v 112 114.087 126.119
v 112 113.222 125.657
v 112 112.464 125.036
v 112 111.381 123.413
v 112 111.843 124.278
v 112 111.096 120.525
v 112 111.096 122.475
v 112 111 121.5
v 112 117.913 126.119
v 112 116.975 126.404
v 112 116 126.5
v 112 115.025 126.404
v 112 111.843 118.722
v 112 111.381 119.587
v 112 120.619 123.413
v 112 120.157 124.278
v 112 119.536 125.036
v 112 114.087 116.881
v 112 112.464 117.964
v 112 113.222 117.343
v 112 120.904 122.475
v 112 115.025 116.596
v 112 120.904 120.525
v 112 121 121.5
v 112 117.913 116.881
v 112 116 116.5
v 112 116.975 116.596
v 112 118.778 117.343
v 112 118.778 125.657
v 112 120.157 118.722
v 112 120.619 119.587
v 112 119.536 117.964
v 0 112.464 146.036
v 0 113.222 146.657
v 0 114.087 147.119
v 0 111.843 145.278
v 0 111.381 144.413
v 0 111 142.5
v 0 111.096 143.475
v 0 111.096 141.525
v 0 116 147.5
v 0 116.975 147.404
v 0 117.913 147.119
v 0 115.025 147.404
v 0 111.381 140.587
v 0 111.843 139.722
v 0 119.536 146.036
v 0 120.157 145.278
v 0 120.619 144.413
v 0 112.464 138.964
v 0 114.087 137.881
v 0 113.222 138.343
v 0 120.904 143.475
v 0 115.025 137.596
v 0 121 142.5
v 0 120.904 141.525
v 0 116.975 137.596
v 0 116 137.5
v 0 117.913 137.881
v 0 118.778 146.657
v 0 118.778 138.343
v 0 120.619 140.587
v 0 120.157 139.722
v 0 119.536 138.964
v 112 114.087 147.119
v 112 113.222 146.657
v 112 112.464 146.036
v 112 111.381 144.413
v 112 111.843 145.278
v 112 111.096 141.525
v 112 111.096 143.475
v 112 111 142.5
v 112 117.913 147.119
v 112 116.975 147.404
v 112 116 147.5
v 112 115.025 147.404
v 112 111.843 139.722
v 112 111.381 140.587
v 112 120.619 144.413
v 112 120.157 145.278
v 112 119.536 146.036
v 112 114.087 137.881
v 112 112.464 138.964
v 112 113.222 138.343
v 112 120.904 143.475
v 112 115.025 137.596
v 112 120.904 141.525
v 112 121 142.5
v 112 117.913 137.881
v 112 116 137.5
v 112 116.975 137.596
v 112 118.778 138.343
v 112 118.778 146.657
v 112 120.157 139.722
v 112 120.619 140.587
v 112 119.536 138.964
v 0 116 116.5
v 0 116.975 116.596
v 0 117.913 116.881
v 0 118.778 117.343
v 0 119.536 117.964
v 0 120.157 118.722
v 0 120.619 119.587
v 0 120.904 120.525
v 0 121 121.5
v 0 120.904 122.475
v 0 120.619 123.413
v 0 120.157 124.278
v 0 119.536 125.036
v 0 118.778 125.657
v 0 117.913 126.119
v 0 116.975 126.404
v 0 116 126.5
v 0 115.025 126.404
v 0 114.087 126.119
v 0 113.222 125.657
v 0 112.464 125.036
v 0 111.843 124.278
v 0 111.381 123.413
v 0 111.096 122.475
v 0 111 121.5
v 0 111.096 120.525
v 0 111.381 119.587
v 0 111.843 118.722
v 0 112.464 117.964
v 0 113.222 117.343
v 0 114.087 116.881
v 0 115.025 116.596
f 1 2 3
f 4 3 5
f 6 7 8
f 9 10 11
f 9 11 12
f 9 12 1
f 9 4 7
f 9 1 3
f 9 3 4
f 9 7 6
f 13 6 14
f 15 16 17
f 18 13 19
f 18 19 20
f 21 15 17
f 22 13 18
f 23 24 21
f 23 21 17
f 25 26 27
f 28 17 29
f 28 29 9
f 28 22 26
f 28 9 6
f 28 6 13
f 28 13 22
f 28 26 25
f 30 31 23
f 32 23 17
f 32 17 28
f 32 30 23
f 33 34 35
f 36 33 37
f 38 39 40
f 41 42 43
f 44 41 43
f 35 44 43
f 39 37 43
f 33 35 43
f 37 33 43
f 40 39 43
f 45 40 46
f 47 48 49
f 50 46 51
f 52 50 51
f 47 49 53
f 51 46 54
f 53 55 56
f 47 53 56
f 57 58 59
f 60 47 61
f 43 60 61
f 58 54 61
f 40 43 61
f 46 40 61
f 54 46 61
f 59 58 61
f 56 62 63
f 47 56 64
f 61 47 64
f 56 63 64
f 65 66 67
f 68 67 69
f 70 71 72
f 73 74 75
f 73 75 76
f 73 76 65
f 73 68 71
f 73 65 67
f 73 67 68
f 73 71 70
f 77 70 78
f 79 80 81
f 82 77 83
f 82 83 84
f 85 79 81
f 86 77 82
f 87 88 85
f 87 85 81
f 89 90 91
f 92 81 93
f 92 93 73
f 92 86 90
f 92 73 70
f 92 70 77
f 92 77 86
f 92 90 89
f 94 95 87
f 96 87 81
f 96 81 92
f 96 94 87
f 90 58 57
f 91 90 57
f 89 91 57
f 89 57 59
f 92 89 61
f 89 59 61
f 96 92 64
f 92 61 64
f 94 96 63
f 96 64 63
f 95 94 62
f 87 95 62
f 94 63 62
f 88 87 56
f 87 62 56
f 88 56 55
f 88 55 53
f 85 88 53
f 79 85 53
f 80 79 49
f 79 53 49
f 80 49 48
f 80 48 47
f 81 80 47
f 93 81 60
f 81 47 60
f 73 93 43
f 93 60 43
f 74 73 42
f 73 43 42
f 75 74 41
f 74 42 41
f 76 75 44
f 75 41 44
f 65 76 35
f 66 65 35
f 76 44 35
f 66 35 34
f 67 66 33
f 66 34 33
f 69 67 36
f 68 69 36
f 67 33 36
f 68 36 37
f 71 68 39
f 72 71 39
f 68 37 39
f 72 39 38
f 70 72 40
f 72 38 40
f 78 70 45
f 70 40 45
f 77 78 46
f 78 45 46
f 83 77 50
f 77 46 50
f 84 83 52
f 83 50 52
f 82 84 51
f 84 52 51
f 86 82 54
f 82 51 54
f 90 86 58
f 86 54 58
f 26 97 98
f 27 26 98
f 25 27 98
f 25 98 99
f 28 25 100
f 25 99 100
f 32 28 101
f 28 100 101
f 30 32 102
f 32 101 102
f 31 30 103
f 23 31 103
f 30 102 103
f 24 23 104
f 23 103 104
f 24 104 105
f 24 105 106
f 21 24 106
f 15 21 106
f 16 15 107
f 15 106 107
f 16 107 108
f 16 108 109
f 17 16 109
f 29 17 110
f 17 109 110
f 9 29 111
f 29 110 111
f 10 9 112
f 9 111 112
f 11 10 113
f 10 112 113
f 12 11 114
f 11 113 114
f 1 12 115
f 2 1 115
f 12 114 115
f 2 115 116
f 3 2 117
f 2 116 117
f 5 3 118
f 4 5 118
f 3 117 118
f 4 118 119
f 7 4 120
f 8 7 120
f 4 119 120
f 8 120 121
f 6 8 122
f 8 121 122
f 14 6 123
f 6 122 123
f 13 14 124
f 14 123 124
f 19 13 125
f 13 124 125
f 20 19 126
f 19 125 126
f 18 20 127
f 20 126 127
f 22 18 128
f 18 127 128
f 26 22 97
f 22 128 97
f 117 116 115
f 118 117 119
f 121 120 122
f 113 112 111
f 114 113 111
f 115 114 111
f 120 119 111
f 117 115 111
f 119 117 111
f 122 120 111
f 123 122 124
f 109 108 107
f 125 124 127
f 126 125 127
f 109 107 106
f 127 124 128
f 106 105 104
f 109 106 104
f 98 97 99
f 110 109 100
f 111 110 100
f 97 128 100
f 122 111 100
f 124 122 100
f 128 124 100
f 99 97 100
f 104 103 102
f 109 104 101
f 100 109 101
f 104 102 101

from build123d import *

# Parameters (mm, degrees)
CYLINDER002_R     = 5
CYLINDER002_DEPTH = 112
CYLINDER001_R     = 5
CYLINDER001_DEPTH = 112


with BuildPart() as cylinder002:
    # Cylinder002 → Cylinder002 (new body)
    with BuildSketch(Plane(origin=(0, 116, 142.5), x_dir=(0, 0, -1), z_dir=(1, 0, 0))):
        Circle(CYLINDER002_R)
    extrude(amount=CYLINDER002_DEPTH)


with BuildPart() as nitrogenpipes10mm:
    # Cylinder001 → Cylinder001 (new body)
    with BuildSketch(Plane(origin=(0, 116, 121.5), x_dir=(0, 0, -1), z_dir=(1, 0, 0))):
        Circle(CYLINDER001_R)
    extrude(amount=CYLINDER001_DEPTH)

    # Fusion: union Cylinder002
    add(cylinder002.part)


solid = nitrogenpipes10mm.part
